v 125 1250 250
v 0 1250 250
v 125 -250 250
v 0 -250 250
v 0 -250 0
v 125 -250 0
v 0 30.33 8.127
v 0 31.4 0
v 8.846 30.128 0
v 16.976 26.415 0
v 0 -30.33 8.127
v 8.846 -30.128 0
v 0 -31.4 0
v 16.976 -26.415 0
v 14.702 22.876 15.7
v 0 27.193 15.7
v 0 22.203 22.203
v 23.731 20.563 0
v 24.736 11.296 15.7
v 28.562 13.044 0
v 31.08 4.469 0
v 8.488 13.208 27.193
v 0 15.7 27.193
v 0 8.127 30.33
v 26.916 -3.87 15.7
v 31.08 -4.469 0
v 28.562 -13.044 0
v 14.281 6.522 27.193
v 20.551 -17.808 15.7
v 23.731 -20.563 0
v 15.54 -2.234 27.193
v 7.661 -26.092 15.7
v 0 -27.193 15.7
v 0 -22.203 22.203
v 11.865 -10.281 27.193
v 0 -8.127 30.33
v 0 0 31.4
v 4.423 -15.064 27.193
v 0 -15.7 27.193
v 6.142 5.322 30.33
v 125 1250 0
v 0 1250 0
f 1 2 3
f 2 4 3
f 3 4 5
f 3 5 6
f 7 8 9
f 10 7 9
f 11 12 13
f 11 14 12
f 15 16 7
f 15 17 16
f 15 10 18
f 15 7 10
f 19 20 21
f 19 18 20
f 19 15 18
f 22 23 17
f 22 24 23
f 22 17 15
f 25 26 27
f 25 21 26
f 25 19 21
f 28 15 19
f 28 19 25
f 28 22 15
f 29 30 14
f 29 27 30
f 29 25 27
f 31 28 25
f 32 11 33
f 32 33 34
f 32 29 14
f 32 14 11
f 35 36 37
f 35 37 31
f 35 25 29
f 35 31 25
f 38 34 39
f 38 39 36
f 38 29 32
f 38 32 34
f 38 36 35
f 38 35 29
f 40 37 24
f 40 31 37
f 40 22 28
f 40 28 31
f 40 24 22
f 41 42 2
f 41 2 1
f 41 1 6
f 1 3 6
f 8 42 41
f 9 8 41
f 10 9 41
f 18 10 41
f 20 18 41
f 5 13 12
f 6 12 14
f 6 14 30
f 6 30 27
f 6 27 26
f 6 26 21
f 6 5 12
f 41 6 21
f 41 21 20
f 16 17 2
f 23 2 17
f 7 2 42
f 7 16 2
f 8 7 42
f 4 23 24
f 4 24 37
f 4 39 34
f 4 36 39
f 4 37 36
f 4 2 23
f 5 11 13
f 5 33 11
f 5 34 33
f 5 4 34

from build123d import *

# Parameters (mm, degrees)
F0_W      = 125
F0_H      = 250
F1_DEPTH  = 250
F1_FACE_W = 125
F1_FACE_H = 250
F2_DEPTH  = 1250


with BuildPart() as f1:
    # F0 (on Front) → F1 (new body)
    with BuildSketch(Plane.XZ):
        with Locations((62.5, 125)):
            Rectangle(F0_W, F0_H)
    extrude(amount=F1_DEPTH)

    # F1_face (on face) → F2 (join)
    with BuildSketch(Plane(origin=(62.5, 0, 125), x_dir=(1, 0, 0), z_dir=(0, 1, 0))):
        Rectangle(F1_FACE_W, F1_FACE_H)
    extrude(amount=F2_DEPTH)

    # F3 (on Front) → F4 (revolve, cut)
    with BuildSketch(Plane.XZ):
        with BuildLine():
            ThreePointArc((31.4, 0), (22.203153, 22.203153), (0, 31.4))
            Line((0, 31.4), (0, 0))
            Line((0, 0), (31.4, 0))
        make_face()
    revolve(axis=Axis((0, 0, 15.7), (0, 0, -1)), mode=Mode.SUBTRACT)


solid = f1.part
